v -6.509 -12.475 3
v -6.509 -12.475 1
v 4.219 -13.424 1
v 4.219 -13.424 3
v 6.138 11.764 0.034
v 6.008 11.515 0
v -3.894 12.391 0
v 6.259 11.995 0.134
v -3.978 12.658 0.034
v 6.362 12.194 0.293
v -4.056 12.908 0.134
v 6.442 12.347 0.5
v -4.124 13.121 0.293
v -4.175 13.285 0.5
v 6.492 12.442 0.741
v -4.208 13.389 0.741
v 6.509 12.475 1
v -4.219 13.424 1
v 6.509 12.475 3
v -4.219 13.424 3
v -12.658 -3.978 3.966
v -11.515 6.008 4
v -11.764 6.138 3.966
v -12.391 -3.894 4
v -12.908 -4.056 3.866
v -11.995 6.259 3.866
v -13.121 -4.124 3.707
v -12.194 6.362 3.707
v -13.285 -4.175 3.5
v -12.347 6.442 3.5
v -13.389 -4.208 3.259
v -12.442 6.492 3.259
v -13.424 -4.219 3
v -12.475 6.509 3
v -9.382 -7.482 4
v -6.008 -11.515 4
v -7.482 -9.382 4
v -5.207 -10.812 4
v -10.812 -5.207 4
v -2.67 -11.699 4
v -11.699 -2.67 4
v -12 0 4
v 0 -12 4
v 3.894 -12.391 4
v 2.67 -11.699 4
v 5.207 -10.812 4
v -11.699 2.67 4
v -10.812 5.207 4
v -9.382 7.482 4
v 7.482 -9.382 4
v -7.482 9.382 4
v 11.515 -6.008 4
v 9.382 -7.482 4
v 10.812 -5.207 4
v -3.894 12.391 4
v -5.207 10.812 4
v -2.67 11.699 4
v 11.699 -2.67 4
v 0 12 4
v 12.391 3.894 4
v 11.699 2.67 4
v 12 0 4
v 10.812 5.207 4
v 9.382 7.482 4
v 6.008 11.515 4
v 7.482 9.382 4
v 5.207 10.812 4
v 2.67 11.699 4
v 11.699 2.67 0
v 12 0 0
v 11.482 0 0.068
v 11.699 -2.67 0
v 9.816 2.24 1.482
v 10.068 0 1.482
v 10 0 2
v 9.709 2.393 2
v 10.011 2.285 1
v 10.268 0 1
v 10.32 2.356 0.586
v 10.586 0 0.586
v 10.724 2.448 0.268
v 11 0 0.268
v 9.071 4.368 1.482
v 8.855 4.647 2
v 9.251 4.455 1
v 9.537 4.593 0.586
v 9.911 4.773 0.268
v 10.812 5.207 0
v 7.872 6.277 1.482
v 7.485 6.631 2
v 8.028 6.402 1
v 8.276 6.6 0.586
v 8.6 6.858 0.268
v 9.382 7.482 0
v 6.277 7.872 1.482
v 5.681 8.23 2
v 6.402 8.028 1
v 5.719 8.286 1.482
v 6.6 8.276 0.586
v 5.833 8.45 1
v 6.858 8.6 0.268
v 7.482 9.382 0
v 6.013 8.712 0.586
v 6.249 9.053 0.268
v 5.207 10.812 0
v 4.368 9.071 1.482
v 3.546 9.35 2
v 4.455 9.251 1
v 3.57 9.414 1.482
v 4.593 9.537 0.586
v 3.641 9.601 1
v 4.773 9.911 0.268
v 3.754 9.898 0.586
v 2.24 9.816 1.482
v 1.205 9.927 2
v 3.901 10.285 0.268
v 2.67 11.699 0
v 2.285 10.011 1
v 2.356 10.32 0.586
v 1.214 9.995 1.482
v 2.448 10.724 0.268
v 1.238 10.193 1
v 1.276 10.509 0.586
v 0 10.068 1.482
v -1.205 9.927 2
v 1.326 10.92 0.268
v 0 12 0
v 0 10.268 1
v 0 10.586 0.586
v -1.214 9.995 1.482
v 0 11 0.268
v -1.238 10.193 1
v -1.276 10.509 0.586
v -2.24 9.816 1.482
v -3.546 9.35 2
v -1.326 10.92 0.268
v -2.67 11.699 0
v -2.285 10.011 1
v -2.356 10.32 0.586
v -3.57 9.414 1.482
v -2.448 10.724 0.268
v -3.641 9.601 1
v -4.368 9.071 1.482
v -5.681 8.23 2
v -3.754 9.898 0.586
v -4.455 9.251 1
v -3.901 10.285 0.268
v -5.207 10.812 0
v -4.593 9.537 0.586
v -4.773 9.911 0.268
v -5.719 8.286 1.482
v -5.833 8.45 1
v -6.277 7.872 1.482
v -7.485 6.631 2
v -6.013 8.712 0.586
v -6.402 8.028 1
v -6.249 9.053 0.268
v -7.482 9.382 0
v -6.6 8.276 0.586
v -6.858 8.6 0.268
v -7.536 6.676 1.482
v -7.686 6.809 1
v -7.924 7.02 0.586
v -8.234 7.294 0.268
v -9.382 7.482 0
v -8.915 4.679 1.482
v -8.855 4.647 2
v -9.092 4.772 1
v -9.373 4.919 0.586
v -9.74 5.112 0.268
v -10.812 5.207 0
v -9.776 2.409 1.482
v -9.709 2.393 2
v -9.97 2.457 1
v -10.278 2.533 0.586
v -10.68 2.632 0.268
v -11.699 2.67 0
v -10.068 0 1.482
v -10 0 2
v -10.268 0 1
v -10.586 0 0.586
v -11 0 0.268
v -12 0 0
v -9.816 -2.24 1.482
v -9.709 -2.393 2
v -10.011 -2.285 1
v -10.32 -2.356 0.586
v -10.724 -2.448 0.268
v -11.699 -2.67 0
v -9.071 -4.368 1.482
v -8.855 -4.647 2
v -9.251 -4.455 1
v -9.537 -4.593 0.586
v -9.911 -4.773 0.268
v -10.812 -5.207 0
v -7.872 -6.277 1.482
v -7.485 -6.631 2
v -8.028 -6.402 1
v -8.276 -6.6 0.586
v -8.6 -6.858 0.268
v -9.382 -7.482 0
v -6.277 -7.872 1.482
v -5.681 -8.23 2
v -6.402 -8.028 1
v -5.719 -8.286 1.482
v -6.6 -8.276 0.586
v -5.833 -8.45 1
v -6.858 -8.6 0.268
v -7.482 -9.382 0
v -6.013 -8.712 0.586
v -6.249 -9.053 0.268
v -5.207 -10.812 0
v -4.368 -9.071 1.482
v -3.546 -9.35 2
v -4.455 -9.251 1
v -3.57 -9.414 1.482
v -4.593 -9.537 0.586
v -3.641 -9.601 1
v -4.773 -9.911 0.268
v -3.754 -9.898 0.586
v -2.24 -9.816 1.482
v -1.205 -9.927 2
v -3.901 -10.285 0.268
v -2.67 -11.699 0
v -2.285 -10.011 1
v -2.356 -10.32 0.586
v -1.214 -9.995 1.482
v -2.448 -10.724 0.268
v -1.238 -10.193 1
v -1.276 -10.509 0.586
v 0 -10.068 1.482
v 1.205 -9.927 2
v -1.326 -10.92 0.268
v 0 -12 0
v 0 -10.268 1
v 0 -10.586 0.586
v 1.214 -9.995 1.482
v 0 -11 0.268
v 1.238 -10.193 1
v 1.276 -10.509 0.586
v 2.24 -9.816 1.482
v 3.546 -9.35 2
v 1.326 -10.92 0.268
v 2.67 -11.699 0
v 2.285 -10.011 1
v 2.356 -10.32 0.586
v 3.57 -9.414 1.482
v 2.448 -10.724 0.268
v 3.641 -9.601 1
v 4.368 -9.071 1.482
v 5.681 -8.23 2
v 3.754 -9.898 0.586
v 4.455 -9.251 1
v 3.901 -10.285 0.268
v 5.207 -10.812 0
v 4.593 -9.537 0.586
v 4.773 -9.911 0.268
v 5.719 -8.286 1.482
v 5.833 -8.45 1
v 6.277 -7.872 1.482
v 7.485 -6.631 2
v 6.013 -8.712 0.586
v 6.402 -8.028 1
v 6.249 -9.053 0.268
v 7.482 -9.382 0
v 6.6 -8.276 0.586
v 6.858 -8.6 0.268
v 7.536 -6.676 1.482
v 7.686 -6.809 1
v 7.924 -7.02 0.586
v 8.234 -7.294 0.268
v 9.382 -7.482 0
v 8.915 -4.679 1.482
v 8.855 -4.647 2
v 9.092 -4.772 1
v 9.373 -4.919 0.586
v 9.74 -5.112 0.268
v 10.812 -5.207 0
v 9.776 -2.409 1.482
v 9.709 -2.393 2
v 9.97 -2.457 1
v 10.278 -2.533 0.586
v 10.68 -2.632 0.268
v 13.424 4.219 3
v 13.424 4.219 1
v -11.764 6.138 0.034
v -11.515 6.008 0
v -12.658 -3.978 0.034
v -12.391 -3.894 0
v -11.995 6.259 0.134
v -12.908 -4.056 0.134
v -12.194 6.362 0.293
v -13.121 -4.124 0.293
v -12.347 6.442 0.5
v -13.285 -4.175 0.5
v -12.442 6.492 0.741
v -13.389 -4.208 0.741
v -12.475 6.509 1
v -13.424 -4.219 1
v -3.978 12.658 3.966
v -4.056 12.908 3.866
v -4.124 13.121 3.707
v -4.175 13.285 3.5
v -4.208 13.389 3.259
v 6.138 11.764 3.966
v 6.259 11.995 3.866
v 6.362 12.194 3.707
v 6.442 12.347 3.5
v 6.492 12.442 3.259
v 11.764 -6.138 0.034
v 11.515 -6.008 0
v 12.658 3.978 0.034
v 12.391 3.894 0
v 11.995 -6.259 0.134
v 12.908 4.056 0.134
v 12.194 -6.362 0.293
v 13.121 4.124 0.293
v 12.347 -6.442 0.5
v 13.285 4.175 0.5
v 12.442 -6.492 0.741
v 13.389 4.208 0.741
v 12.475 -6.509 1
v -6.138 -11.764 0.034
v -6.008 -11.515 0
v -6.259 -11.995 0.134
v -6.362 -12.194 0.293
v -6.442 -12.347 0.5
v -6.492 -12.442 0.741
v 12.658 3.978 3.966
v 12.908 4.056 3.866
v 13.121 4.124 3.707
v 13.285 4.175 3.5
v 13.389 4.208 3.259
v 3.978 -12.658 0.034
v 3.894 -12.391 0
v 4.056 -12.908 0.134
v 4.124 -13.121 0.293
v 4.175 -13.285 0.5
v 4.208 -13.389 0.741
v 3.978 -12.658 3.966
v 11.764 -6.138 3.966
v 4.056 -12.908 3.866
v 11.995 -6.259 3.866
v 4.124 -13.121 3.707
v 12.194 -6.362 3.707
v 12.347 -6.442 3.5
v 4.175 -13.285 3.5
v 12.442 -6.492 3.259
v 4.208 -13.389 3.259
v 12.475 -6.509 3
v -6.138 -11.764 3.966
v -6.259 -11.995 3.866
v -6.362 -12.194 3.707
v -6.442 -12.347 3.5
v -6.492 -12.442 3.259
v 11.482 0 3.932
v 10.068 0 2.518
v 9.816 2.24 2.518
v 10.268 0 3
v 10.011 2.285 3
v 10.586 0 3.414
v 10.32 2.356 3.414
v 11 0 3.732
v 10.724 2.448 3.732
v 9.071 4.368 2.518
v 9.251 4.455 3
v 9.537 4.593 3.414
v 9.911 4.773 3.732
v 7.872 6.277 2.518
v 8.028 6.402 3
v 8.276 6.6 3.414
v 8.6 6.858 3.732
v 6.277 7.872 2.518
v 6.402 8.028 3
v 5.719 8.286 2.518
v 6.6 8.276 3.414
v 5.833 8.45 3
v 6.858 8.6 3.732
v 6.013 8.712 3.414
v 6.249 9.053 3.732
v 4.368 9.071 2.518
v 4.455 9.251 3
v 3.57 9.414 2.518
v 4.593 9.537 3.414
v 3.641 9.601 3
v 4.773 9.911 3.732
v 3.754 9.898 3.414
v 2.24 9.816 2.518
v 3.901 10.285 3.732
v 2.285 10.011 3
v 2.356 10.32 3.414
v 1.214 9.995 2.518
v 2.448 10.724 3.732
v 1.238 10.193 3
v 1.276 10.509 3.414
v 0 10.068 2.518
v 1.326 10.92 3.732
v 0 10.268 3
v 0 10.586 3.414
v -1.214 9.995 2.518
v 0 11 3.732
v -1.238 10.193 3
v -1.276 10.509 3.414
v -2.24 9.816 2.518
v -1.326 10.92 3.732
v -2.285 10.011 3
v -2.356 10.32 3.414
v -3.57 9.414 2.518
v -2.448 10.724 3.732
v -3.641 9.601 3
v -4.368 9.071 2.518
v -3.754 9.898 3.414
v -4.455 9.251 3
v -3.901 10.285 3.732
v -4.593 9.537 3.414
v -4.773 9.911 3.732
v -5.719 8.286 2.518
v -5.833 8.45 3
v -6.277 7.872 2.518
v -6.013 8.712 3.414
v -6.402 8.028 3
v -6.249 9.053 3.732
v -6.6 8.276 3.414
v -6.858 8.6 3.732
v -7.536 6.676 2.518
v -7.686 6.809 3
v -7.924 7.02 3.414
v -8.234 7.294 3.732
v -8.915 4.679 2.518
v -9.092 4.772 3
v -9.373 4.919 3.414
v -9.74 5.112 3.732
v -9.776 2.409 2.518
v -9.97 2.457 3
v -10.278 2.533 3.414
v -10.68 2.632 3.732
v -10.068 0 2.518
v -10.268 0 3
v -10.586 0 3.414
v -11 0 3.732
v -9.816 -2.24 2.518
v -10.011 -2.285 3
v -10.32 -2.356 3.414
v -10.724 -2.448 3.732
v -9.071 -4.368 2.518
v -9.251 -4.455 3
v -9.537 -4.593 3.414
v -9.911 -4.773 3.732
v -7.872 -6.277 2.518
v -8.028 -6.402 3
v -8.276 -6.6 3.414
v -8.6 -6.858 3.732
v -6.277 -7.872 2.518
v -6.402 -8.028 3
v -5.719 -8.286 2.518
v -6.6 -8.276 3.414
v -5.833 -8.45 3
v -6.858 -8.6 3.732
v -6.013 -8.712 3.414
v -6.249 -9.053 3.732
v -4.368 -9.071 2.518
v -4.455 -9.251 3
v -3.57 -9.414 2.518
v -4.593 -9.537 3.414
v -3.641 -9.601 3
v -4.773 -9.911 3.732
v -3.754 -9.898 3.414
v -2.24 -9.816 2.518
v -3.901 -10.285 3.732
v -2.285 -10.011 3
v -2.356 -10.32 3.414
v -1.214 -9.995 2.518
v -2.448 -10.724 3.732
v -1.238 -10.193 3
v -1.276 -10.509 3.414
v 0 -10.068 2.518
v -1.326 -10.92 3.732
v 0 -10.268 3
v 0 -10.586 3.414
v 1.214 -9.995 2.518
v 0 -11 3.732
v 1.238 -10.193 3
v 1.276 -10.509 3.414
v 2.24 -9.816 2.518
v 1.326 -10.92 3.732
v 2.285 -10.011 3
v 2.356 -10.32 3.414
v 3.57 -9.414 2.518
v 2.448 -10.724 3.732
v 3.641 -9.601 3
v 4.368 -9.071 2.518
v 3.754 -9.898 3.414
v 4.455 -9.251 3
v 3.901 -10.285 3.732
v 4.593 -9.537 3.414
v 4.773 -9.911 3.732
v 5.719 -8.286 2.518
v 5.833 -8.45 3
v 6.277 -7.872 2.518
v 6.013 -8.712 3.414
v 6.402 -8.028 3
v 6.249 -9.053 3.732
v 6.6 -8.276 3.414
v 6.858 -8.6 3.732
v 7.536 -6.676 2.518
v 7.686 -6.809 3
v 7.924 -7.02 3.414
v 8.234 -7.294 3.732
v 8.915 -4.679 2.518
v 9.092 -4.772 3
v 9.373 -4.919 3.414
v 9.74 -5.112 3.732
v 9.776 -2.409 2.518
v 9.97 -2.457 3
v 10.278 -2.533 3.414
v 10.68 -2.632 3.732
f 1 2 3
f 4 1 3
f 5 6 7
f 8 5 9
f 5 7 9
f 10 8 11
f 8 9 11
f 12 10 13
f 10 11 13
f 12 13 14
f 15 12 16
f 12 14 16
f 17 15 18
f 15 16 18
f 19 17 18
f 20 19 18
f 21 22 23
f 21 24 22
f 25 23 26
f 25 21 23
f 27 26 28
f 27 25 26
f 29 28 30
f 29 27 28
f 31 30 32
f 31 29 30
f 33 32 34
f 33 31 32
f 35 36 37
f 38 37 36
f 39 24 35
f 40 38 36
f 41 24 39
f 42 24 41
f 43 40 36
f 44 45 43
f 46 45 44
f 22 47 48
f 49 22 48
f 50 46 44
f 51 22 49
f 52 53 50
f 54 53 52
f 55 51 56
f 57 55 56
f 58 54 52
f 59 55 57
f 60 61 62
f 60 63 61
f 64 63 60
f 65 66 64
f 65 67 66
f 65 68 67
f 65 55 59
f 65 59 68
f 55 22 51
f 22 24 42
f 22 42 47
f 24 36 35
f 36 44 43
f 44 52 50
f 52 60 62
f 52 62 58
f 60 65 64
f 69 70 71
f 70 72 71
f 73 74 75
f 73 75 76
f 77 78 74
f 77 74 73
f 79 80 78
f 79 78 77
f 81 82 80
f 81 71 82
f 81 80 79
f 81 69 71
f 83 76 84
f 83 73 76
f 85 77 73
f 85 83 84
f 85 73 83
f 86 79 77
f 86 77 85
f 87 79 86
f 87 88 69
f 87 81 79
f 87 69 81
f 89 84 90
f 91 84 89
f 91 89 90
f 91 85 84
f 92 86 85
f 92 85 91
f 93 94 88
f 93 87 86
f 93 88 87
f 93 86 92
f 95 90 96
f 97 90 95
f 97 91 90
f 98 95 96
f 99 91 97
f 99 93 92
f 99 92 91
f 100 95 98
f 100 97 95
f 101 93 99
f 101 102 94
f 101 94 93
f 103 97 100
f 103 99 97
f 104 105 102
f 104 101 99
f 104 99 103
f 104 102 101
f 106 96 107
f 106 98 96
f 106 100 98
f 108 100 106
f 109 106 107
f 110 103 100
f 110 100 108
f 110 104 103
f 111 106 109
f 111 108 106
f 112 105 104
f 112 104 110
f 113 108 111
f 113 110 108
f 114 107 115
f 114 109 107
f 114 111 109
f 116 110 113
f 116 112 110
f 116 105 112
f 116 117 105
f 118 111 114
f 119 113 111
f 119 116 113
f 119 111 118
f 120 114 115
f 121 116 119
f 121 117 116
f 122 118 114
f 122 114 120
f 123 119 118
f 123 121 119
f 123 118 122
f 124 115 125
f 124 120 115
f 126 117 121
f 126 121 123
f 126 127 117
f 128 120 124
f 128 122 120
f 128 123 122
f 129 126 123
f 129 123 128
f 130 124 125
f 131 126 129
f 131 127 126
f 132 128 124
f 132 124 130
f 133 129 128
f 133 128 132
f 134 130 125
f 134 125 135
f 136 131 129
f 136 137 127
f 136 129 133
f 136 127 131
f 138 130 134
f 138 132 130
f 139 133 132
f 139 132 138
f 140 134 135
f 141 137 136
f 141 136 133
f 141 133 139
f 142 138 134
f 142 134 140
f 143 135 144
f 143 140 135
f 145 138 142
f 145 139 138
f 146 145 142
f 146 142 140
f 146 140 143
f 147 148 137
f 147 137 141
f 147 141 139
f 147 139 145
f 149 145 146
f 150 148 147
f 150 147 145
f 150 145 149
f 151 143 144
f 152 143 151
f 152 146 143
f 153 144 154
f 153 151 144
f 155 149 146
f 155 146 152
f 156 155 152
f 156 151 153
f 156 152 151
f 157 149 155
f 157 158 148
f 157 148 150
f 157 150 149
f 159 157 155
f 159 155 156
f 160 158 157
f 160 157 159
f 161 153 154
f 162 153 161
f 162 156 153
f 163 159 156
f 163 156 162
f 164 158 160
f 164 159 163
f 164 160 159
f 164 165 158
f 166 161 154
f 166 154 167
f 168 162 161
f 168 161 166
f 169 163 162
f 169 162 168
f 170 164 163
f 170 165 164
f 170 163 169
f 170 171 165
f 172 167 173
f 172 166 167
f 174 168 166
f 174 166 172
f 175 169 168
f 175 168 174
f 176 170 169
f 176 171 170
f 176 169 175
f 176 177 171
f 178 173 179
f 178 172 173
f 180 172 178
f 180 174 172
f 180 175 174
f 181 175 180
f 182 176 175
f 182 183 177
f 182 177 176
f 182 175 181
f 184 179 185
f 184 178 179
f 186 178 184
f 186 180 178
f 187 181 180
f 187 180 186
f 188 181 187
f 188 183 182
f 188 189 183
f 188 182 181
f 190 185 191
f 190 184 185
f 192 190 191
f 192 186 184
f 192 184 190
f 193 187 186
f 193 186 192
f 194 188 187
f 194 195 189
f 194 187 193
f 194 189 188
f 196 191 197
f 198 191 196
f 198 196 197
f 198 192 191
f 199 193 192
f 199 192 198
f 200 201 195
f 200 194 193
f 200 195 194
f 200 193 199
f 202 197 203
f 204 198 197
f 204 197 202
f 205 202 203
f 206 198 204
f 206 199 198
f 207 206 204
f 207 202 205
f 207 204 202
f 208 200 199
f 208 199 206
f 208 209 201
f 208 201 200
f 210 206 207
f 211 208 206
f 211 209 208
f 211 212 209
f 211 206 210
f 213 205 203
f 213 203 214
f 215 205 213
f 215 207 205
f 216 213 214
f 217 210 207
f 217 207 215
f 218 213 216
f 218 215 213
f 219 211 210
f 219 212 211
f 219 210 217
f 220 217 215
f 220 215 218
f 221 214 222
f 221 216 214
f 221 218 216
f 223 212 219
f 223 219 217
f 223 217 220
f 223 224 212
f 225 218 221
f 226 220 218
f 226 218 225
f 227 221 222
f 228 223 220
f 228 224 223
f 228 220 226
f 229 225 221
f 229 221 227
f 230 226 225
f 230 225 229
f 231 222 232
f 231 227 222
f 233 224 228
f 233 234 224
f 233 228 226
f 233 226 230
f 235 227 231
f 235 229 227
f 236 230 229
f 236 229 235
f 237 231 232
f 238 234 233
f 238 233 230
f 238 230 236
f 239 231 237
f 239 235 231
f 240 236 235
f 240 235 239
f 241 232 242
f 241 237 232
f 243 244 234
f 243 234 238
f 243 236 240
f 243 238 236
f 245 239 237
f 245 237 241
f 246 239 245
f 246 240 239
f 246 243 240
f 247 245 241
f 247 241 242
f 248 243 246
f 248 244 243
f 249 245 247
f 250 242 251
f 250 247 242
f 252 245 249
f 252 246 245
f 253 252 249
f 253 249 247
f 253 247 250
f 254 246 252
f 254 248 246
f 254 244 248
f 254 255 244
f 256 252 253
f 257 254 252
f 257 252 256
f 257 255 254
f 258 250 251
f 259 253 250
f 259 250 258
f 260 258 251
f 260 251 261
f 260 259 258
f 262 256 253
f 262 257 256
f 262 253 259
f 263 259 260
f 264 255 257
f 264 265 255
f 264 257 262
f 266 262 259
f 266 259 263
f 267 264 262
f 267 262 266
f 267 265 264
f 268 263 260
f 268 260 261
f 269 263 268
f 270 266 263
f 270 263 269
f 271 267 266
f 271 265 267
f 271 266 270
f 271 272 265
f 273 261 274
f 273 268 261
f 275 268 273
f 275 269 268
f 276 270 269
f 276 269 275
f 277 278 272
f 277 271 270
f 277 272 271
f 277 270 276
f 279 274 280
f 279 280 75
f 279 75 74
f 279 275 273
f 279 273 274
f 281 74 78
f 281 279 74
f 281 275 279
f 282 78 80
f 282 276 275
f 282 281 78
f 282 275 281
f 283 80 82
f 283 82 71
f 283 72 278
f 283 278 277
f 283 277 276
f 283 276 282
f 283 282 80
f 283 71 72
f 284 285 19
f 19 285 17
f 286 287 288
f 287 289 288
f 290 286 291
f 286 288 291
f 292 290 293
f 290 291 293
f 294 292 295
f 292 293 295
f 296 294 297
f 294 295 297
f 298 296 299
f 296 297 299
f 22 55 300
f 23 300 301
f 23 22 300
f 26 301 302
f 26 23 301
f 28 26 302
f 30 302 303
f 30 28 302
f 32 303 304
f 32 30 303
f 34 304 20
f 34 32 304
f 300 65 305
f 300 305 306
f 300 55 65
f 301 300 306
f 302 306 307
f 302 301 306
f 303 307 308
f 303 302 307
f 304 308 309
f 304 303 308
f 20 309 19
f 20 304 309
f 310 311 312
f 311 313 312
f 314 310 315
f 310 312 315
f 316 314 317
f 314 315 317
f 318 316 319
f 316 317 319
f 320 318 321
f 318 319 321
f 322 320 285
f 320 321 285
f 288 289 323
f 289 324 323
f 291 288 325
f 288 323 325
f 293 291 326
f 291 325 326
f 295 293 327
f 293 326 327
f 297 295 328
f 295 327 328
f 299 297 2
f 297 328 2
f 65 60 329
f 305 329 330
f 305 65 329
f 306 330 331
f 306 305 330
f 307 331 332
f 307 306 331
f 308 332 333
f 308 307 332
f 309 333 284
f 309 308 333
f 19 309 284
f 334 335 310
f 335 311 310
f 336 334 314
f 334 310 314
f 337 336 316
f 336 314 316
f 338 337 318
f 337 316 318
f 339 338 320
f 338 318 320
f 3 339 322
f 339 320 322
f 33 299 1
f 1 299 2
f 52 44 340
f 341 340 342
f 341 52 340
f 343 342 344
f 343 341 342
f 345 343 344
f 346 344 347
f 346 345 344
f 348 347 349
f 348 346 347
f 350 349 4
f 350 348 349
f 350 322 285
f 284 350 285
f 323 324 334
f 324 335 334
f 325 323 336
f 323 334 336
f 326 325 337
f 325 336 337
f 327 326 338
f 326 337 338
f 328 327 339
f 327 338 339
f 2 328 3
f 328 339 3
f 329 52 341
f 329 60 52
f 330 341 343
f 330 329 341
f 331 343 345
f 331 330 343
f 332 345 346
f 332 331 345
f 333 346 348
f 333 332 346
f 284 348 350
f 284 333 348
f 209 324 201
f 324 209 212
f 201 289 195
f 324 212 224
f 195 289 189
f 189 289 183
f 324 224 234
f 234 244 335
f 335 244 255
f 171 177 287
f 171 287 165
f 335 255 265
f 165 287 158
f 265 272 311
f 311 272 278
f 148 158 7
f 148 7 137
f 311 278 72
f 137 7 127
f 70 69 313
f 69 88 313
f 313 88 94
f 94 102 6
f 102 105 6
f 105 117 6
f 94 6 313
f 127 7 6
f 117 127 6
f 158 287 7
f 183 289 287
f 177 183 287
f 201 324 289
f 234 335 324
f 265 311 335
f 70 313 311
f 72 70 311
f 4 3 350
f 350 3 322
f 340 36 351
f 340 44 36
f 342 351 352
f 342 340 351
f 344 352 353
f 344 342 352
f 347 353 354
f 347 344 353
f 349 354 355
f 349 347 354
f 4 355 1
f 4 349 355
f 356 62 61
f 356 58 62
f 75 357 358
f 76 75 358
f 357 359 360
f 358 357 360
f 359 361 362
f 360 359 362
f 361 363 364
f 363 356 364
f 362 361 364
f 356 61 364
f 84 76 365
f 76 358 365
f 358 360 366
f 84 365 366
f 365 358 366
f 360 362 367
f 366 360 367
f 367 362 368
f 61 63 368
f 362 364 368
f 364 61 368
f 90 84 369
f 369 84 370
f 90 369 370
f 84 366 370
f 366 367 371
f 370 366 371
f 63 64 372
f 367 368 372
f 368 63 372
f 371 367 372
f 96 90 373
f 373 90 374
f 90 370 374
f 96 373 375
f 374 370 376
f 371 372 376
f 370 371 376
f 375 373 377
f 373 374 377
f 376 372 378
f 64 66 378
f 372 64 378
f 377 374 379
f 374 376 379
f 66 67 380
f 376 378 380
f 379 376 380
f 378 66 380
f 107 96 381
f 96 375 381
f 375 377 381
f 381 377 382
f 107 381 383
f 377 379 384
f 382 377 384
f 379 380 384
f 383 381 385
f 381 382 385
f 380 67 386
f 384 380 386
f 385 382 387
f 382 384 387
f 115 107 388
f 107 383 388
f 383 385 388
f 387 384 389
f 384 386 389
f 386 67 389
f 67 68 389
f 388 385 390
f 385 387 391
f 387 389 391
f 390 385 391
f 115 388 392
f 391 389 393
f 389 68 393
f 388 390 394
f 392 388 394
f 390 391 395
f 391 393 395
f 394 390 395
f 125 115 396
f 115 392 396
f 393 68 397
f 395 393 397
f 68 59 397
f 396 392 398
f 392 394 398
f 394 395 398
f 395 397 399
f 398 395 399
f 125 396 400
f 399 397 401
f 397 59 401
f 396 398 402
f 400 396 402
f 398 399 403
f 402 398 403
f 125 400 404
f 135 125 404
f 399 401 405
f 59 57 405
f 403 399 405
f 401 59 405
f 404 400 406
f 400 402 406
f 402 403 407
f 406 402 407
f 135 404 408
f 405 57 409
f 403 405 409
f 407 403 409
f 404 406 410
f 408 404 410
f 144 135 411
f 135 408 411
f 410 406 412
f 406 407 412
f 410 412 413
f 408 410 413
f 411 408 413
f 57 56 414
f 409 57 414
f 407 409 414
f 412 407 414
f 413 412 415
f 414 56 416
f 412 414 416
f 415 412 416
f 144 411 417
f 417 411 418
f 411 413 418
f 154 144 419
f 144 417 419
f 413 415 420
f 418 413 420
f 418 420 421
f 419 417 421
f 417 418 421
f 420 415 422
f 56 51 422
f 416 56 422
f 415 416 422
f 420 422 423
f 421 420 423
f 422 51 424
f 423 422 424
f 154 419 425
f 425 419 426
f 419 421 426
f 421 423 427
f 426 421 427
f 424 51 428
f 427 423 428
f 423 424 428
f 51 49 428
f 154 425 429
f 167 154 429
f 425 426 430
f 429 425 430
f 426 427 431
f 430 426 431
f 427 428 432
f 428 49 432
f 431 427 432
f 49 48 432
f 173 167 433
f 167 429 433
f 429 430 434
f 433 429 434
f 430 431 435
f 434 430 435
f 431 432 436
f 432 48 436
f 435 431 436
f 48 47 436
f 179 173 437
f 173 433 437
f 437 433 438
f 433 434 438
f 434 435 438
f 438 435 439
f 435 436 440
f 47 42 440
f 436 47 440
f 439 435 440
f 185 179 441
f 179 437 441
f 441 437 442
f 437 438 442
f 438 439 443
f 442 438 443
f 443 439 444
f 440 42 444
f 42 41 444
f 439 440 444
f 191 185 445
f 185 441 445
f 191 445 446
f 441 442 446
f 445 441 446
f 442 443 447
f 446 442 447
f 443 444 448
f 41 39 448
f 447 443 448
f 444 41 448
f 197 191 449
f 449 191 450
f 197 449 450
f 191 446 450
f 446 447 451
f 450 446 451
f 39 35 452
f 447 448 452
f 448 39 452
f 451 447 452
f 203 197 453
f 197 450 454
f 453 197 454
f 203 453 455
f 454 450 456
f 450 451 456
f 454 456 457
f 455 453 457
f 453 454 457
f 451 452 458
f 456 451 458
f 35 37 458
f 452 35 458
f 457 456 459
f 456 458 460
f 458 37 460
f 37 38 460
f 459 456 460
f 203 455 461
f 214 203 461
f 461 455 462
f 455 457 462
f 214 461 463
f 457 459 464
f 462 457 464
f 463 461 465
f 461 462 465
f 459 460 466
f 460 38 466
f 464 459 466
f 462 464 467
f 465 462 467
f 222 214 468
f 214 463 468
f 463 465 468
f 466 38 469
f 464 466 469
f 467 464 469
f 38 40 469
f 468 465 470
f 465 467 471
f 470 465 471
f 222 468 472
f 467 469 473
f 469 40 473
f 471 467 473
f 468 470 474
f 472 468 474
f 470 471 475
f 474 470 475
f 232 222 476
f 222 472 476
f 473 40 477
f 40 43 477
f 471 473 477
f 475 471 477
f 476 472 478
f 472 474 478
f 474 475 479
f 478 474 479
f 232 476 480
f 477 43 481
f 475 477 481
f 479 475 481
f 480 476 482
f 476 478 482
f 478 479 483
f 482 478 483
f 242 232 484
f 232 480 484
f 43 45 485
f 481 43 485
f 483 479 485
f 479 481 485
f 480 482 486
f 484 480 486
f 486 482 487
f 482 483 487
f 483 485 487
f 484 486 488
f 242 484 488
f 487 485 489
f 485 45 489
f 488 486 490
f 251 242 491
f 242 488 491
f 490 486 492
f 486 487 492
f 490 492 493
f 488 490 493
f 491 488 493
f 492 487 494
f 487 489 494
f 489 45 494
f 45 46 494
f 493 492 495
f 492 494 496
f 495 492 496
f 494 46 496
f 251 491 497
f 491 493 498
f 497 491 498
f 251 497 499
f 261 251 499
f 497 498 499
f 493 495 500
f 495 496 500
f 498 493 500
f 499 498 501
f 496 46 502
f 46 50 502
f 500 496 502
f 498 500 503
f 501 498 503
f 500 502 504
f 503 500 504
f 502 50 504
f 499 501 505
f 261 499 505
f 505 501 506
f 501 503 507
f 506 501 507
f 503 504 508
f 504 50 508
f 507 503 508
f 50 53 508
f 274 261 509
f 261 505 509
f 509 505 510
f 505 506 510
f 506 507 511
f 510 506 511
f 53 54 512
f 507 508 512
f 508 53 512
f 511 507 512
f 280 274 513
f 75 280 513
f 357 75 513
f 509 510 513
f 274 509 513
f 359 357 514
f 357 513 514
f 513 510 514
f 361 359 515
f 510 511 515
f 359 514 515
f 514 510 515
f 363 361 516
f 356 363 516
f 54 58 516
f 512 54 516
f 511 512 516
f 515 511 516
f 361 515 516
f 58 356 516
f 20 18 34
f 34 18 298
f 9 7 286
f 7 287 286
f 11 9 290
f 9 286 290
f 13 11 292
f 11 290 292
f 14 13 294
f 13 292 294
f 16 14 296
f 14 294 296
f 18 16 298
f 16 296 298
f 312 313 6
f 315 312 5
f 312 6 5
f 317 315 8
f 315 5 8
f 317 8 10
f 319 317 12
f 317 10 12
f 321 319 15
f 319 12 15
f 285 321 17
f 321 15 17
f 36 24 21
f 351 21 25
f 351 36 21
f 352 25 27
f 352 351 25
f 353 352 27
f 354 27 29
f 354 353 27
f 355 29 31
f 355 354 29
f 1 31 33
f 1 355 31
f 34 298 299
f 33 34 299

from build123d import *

# Parameters (mm, degrees)
F0_R     = 10
F1_DEPTH = 4
F2_R     = 1.99999
F3_R     = 1


# Not quite as in the source:
# - a fillet or chamfer is up to 0.001 mm smaller than in the source, because OpenCascade refuses the exact size


with BuildPart() as f1:
    # F0 (on Top) → F1 (new body)
    with BuildSketch(Plane.XY):
        Polygon((4.2186513593, -13.4238145334), (12.4751072696, -6.5090333023), (13.4238145334, 4.2186513593), (6.5090333023, 12.4751072696), (-4.2186513593, 13.4238145334), (-12.4751072696, 6.5090333023), (-13.4238145334, -4.2186513593), (-6.5090333023, -12.4751072696), align=None)
        Circle(F0_R, mode=Mode.SUBTRACT)
    extrude(amount=F1_DEPTH)

    # F2 (radius 2 in the source; OpenCascade refuses exactly that, so slightly less here)
    f2_edges = [f1.edges().sort_by_distance(p)[0] for p in [
        (-10, 0, 0),
        (-10, 0, 4),
    ]]
    fillet(f2_edges, radius=F2_R)

    # F3
    f3_edges = [f1.edges().sort_by_distance(p)[0] for p in [
        (1.145191, 12.949461, 4),
        (-8.346879, 9.966424, 4),
        (-12.949461, 1.145191, 4),
        (-9.966424, -8.346879, 4),
        (-1.145191, -12.949461, 4),
        (8.346879, -9.966424, 4),
        (12.949461, -1.145191, 4),
        (9.966424, 8.346879, 4),
        (9.966424, 8.346879, 0),
        (12.949461, -1.145191, 0),
        (8.346879, -9.966424, 0),
        (-1.145191, -12.949461, 0),
        (-9.966424, -8.346879, 0),
        (-12.949461, 1.145191, 0),
        (-8.346879, 9.966424, 0),
        (1.145191, 12.949461, 0),
    ]]
    fillet(f3_edges, radius=F3_R)


solid = f1.part
